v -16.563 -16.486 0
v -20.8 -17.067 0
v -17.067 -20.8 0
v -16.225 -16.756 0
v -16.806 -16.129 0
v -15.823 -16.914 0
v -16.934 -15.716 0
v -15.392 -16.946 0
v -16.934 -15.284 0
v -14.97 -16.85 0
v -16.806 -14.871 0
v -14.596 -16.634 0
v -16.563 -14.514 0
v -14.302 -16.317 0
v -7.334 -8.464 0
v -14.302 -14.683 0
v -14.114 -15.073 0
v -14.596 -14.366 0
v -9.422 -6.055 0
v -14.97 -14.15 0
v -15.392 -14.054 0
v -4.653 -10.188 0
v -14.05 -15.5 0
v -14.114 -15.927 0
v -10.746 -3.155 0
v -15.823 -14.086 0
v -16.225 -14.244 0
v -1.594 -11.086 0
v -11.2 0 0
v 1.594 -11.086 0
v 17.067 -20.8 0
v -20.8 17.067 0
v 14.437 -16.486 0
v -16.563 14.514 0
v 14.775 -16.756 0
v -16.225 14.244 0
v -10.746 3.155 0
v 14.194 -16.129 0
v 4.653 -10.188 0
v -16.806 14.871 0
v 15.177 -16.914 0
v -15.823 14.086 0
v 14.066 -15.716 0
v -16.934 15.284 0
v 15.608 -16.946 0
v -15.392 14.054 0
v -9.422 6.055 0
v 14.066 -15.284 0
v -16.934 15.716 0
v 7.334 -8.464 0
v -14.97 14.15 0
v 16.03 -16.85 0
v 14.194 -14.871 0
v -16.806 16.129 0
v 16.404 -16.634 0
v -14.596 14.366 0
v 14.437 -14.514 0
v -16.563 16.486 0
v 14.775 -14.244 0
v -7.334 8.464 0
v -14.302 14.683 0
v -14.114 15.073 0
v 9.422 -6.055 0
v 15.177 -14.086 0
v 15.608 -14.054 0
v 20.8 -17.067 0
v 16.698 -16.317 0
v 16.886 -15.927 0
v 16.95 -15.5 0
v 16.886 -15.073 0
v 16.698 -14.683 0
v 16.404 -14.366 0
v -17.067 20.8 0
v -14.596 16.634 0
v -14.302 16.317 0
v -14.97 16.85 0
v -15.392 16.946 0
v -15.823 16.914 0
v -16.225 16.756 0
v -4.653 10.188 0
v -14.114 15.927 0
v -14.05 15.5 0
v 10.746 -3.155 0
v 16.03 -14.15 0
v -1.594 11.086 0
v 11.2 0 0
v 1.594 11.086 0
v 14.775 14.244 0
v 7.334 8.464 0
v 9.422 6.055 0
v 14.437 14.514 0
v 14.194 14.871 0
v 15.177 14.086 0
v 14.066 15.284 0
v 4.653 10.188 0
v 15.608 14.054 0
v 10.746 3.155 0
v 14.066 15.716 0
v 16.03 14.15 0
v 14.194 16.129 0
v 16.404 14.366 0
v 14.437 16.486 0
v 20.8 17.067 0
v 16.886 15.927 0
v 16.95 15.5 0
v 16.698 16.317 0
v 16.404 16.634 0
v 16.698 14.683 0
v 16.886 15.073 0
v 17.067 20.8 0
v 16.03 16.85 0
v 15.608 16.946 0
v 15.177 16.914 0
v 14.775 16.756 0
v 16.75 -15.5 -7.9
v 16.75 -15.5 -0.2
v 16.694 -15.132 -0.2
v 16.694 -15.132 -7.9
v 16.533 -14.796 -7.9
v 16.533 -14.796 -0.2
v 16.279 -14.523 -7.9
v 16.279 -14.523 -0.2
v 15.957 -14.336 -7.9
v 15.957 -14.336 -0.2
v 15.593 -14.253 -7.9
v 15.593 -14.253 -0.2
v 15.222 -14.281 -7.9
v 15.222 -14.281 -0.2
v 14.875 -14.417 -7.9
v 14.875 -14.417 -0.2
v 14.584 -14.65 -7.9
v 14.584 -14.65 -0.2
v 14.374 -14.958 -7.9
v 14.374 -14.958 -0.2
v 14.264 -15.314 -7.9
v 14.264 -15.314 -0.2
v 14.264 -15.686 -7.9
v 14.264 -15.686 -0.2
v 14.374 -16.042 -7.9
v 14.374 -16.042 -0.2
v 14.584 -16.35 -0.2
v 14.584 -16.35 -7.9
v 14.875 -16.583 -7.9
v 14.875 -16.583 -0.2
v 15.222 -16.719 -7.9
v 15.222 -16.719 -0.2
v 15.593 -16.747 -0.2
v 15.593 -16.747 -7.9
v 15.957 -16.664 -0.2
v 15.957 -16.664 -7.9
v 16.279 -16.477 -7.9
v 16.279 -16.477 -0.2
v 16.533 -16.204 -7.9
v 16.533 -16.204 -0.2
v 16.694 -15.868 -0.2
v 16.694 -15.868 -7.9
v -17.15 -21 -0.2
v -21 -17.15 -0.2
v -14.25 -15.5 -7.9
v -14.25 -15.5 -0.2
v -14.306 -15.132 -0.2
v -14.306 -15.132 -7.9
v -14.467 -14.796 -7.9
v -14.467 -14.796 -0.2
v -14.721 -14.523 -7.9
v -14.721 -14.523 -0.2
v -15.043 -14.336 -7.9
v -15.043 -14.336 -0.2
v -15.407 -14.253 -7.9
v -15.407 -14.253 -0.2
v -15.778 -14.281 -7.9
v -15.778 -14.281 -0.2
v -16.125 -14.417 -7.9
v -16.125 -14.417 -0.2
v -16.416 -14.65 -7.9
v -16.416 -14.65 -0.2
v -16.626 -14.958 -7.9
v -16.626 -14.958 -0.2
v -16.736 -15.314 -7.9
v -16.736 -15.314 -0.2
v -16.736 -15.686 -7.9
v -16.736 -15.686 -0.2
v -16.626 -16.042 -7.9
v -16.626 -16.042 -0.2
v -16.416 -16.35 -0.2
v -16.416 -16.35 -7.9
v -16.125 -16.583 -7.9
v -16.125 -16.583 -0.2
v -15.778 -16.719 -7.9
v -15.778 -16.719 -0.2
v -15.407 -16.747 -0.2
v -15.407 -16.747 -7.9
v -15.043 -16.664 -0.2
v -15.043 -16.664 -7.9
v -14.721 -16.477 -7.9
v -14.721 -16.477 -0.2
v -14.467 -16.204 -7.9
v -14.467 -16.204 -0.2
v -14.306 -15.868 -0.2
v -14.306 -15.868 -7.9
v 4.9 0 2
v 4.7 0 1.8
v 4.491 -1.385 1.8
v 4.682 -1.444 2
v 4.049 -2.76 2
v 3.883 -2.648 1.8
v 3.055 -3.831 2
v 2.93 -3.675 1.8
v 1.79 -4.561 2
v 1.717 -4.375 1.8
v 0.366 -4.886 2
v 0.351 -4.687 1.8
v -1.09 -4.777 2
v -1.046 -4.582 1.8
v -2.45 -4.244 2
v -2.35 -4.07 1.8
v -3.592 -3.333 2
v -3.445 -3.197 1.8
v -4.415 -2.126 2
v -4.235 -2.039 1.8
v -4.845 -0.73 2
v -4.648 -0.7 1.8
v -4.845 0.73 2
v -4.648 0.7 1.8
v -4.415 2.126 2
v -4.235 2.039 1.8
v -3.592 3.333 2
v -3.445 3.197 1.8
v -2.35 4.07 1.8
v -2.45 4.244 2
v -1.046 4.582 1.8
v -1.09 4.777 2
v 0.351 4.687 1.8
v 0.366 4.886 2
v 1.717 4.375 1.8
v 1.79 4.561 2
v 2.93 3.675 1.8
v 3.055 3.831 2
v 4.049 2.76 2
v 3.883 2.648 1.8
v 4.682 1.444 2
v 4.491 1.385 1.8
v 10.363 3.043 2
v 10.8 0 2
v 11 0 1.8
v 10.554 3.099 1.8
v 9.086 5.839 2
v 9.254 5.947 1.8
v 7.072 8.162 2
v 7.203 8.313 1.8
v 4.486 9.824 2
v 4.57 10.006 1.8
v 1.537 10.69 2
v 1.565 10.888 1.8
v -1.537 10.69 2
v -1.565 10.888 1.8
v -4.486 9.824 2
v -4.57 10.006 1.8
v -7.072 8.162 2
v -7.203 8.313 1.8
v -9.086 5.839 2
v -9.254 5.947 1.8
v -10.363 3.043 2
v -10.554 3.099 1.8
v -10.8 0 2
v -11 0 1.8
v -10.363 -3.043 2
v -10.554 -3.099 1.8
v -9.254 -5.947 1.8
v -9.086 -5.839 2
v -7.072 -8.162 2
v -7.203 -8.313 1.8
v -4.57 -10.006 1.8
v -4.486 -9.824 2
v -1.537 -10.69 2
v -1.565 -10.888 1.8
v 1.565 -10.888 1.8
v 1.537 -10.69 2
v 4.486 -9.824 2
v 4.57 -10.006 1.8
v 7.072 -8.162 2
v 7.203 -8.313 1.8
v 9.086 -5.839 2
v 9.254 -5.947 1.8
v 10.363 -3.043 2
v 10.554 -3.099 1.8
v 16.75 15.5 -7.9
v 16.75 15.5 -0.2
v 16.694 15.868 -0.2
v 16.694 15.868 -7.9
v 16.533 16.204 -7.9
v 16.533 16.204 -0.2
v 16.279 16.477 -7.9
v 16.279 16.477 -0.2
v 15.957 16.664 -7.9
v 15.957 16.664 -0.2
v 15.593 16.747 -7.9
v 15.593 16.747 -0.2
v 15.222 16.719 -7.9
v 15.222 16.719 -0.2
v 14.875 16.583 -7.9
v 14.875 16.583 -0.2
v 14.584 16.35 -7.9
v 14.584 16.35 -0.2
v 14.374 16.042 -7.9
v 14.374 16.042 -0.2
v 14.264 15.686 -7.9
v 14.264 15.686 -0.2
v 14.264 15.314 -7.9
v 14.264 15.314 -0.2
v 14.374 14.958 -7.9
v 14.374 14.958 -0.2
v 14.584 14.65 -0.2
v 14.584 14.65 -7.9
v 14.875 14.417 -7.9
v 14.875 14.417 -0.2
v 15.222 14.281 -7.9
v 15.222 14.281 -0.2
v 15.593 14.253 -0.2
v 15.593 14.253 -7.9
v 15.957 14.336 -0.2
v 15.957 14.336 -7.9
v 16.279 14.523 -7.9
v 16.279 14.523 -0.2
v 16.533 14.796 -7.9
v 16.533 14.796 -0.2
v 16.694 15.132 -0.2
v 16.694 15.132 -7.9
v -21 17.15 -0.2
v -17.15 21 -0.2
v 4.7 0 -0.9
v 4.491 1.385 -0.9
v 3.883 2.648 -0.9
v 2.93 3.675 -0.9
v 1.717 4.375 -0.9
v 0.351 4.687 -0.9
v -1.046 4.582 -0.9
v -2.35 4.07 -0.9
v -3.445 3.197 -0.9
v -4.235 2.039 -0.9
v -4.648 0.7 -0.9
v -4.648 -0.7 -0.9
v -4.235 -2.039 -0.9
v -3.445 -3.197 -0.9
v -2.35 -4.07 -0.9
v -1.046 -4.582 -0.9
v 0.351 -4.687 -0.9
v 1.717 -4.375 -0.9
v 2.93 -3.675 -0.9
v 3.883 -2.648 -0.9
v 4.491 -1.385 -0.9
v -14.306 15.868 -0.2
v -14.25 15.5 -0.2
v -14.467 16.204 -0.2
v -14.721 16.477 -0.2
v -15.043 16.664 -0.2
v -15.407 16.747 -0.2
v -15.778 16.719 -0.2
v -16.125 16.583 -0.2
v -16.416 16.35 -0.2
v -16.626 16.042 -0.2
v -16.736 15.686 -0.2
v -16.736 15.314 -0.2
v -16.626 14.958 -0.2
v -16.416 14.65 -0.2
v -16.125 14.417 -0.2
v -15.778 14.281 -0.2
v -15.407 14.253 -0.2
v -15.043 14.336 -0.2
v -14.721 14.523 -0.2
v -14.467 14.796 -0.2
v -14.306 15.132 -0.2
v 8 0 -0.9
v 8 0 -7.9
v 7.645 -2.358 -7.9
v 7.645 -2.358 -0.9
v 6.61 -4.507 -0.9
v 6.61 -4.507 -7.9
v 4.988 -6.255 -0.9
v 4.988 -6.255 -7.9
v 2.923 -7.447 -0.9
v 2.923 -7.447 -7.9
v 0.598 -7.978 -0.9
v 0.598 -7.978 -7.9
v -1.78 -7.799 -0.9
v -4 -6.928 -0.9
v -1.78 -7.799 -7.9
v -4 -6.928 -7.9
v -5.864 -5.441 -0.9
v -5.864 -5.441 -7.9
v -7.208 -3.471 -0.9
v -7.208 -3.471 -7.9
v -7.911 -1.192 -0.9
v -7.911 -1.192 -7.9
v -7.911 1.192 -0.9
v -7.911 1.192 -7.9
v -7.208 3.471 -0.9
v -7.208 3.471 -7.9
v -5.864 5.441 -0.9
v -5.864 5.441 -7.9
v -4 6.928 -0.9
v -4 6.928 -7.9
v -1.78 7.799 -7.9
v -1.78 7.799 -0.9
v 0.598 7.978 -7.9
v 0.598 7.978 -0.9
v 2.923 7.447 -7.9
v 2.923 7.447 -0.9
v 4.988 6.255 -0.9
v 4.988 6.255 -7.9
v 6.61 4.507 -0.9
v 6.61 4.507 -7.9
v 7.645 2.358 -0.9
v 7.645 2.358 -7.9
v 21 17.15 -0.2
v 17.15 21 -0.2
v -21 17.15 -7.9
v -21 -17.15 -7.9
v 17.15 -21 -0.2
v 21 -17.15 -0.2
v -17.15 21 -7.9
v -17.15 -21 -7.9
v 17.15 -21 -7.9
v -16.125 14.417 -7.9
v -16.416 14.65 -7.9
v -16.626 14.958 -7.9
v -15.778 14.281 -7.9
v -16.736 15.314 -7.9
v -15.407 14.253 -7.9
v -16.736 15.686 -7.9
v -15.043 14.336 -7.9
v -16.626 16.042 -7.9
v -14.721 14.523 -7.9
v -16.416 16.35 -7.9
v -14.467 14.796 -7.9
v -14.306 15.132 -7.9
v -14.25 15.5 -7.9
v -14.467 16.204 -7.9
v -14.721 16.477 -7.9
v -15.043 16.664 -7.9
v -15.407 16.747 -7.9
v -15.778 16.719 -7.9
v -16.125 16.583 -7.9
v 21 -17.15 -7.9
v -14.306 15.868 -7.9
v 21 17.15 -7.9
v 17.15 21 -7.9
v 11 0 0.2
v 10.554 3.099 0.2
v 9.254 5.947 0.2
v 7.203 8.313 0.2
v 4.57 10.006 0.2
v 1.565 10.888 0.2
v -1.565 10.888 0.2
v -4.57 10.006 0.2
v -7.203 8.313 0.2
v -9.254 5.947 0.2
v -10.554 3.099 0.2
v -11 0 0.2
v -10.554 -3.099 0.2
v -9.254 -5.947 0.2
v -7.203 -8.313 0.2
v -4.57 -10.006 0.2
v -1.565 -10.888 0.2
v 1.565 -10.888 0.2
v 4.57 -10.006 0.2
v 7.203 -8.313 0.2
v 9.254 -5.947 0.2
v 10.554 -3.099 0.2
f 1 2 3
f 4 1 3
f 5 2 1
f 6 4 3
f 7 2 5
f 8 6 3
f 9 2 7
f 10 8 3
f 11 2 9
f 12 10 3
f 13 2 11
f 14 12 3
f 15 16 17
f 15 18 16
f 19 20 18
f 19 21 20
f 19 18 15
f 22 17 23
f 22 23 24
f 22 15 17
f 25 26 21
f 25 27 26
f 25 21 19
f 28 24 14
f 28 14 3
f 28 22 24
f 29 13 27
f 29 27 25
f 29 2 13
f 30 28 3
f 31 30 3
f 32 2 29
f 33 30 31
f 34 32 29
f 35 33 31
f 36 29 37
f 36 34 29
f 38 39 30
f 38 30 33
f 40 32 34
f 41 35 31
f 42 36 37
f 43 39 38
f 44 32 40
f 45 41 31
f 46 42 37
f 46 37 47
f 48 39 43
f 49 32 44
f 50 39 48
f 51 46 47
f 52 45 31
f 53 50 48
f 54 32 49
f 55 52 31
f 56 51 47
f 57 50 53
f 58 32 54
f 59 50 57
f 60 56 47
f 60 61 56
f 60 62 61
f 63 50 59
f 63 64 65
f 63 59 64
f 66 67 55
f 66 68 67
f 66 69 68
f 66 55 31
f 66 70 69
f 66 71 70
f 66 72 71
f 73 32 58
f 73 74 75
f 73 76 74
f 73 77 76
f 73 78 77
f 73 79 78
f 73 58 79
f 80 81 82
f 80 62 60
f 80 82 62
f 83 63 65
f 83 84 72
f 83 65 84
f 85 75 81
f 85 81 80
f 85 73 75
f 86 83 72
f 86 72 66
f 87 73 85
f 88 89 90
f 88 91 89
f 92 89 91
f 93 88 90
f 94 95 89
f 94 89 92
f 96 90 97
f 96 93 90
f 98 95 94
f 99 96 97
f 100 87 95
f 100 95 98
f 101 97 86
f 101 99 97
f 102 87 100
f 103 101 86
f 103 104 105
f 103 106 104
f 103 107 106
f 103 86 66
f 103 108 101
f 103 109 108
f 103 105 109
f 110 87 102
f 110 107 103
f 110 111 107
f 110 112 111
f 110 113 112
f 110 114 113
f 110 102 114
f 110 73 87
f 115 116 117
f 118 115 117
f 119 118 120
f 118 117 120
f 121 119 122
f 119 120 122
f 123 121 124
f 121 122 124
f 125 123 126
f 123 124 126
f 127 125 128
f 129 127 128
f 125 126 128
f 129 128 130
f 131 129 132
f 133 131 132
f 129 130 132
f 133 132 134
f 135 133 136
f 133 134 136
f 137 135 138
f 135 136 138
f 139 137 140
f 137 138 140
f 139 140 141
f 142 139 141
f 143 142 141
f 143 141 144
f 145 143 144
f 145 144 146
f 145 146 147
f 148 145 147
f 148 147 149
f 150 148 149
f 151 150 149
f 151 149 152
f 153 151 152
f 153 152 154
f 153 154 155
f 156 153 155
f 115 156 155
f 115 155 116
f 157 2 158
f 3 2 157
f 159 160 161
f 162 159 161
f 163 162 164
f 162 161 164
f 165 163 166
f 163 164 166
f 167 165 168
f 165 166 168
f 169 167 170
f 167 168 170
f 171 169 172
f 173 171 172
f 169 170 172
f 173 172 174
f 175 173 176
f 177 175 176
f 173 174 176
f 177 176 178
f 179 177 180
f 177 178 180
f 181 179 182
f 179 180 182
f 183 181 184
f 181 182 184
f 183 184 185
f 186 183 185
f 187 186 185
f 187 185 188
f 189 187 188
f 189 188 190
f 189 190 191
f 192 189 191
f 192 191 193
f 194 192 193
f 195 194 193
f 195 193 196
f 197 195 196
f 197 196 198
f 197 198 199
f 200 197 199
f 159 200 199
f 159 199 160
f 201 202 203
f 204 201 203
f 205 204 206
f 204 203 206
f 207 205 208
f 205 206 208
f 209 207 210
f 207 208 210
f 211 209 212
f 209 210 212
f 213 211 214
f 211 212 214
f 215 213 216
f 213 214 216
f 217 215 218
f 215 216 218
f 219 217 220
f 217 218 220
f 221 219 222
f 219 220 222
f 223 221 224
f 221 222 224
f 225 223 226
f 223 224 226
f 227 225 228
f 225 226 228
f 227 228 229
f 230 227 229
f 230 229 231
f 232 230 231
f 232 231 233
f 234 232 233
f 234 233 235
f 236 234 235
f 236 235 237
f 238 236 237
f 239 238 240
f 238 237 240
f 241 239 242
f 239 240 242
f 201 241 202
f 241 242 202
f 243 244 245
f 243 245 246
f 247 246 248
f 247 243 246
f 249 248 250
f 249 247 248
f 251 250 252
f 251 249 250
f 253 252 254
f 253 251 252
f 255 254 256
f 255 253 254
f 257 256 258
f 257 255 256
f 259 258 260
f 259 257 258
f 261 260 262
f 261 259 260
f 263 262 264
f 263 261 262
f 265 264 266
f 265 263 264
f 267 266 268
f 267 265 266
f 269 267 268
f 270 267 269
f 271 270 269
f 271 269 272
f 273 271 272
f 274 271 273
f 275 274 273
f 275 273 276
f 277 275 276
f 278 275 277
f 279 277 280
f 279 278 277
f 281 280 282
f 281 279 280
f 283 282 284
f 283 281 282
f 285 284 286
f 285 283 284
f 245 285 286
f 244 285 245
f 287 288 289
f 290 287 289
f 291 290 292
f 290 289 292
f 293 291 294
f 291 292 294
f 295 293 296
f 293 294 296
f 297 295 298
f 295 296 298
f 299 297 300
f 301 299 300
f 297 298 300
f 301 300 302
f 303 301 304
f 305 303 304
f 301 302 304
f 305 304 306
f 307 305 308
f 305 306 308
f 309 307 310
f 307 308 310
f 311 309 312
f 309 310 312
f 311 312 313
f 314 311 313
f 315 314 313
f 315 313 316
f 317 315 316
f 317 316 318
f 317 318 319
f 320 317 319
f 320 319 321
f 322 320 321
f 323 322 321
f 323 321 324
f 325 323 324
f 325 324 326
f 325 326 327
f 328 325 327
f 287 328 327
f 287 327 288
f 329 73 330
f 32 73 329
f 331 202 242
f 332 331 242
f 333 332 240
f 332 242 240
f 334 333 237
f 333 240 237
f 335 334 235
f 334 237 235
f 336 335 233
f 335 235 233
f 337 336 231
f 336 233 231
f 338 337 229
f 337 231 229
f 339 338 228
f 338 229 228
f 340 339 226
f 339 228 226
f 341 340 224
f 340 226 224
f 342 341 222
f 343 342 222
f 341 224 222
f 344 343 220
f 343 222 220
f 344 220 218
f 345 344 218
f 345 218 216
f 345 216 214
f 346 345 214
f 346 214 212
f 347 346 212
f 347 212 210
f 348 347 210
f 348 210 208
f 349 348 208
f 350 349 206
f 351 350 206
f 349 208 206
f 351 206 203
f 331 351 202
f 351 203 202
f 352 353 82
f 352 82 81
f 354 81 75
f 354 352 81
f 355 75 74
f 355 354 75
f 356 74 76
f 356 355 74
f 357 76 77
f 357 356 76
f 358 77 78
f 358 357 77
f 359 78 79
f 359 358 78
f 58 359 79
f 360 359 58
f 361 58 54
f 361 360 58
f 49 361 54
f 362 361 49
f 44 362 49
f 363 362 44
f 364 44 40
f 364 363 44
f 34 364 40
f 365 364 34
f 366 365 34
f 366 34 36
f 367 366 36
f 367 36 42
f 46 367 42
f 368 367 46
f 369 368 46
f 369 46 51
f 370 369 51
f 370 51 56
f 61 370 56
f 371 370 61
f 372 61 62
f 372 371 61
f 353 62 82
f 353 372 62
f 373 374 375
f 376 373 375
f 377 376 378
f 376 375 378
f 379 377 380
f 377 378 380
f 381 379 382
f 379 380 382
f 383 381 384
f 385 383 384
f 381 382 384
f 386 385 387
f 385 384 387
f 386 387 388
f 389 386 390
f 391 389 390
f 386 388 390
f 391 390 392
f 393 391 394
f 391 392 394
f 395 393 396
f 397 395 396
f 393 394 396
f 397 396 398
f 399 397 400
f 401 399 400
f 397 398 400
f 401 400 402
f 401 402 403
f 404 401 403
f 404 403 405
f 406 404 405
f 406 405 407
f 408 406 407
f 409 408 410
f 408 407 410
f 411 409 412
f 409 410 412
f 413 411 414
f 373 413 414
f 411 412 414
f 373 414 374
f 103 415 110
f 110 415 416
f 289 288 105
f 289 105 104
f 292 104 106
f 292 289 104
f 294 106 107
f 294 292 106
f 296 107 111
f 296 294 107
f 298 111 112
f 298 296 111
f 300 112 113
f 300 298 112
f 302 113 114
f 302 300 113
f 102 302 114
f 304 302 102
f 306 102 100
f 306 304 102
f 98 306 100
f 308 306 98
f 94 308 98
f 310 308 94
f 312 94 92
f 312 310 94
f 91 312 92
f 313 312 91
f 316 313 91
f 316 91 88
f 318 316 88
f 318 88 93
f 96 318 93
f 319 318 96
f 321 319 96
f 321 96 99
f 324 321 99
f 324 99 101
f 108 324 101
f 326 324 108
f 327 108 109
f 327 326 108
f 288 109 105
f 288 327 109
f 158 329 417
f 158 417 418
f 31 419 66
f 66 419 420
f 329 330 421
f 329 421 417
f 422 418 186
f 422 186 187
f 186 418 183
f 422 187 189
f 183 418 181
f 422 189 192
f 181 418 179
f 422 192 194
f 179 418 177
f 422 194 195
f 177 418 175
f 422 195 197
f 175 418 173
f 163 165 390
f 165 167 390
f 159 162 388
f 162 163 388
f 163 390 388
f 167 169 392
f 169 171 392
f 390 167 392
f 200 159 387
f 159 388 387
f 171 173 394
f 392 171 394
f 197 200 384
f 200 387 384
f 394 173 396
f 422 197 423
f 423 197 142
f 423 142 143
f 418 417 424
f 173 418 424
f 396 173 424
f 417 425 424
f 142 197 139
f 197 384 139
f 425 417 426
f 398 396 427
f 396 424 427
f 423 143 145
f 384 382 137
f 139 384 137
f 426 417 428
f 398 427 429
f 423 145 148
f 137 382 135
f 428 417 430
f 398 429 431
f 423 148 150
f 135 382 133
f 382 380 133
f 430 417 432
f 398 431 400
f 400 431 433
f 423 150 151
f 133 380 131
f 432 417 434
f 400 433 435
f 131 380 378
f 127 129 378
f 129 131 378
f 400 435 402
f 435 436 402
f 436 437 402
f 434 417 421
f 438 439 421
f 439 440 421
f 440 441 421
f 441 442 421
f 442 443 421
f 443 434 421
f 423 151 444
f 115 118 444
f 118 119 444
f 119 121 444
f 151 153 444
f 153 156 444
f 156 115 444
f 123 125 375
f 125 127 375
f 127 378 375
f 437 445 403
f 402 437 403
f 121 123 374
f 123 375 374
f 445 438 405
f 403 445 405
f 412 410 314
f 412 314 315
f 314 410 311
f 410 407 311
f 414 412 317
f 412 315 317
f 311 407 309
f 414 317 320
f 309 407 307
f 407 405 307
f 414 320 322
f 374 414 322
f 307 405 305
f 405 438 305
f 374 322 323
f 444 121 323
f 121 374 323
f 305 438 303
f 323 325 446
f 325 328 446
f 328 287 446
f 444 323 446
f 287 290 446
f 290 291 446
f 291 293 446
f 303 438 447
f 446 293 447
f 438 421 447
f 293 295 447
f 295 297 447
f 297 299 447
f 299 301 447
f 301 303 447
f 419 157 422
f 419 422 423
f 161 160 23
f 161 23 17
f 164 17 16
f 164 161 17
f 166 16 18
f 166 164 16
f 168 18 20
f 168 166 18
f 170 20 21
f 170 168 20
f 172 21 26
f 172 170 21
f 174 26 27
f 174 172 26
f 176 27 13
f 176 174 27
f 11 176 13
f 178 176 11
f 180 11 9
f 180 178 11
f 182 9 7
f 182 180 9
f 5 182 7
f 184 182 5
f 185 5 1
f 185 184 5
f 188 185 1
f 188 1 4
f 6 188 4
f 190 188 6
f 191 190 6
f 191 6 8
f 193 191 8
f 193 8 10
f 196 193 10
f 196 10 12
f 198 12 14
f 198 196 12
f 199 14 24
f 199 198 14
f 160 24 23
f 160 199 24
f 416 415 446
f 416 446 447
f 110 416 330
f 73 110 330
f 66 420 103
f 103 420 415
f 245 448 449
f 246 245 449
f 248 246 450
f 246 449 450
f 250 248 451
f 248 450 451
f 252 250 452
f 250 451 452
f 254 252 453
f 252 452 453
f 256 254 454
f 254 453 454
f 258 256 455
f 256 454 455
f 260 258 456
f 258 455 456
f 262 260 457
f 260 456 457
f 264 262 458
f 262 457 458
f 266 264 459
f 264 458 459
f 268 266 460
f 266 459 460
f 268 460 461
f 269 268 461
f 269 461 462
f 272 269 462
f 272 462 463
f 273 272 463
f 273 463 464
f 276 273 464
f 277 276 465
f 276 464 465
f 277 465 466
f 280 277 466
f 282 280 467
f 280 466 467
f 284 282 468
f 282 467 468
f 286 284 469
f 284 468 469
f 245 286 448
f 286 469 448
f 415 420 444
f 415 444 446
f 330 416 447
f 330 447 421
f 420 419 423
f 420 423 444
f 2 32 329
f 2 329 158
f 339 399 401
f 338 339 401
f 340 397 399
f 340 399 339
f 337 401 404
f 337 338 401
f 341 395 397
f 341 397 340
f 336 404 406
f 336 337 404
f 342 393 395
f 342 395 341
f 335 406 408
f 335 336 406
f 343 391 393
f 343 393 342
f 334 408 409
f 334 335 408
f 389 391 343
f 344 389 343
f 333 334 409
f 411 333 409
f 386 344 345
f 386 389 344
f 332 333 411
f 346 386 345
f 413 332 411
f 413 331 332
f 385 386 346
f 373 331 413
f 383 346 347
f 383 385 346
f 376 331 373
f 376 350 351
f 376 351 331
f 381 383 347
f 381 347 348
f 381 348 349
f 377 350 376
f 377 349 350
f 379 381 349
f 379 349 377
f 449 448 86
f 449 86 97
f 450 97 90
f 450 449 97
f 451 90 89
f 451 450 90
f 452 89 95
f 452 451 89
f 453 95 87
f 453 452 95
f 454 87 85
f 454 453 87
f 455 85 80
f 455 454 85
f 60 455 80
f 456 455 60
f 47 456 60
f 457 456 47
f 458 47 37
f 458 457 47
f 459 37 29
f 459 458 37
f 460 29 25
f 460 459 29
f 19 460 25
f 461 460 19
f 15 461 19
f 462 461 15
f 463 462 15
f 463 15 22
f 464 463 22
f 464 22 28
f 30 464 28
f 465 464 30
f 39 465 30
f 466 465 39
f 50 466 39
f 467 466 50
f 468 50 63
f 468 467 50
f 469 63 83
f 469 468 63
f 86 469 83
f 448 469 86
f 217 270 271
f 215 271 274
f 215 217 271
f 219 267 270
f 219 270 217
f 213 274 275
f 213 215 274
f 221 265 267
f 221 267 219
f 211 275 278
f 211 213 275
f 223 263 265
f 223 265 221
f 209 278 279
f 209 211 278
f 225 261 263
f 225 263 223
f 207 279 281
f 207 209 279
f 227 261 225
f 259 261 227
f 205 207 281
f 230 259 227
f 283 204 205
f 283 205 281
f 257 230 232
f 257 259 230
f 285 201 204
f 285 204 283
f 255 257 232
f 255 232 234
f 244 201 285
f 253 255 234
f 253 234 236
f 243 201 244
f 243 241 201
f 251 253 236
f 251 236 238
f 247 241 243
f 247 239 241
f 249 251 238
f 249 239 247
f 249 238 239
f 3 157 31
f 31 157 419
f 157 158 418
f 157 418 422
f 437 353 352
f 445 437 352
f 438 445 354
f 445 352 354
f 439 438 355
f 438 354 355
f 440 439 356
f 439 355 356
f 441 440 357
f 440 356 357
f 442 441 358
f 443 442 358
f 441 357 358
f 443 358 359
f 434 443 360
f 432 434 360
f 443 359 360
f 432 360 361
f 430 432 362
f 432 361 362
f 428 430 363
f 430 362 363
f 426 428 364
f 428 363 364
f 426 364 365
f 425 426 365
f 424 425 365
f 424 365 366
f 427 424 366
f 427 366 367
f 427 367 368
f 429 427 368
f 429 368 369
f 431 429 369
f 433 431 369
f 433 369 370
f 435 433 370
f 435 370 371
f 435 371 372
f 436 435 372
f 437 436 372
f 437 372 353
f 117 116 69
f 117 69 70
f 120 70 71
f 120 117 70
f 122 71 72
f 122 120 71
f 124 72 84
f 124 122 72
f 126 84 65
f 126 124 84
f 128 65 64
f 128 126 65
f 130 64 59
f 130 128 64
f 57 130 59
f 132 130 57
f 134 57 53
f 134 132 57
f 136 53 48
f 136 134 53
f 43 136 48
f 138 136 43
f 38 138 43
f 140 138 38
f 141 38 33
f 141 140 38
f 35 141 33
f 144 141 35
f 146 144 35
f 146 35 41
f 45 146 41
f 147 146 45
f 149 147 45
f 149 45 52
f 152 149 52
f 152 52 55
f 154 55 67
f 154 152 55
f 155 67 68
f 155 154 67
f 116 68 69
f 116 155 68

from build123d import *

# Parameters (mm, degrees)
SKETCH_R          = 11
PAD_DEPTH         = 2
PAD001_DEPTH      = 7.9
SKETCH002_R       = 4.7
POCKET_DEPTH      = 7.901
POCKET_DEPTH_BACK = 2.001
SKETCH003_R       = 1.25
HOLE_DEPTH        = 7.901
SKETCH004_R       = 8
POCKET001_DEPTH   = 7
CHAMFER_SIZE      = 0.2


with BuildPart() as part:
    # Sketch → Pad (new body)
    with BuildSketch(Plane.XY):
        Circle(SKETCH_R)
    extrude(amount=PAD_DEPTH)

    # Sketch001 → Pad001 (join)
    with BuildSketch(Plane.XY):
        Polygon((-21, 17.15), (-21, -17.15), (-17.15, -21), (17.15, -21), (21, -17.15), (21, 17.15), (17.15, 21), (-17.15, 21), align=None)
    extrude(amount=-PAD001_DEPTH)

    # Sketch002 → Pocket (cut, two sides)
    with BuildSketch(Plane.XY) as pocket_sk:
        Circle(SKETCH002_R)
    extrude(amount=-POCKET_DEPTH, mode=Mode.SUBTRACT)
    extrude(pocket_sk.sketch, amount=POCKET_DEPTH_BACK, mode=Mode.SUBTRACT)

    # Sketch003 → Hole (cut, through all)
    with BuildSketch(Plane.XY):
        with Locations((-15.5, 15.5)):
            Circle(SKETCH003_R)
        with Locations((15.5, 15.5)):
            Circle(SKETCH003_R)
        with Locations((15.5, -15.5)):
            Circle(SKETCH003_R)
        with Locations((-15.5, -15.5)):
            Circle(SKETCH003_R)
    extrude(amount=-HOLE_DEPTH, mode=Mode.SUBTRACT)

    # Sketch004 → Pocket001 (cut)
    with BuildSketch(Plane(origin=(0, 0, -7.9), x_dir=(1, 0, 0), z_dir=(0, 0, -1))):
        Circle(SKETCH004_R)
    extrude(amount=-POCKET001_DEPTH, mode=Mode.SUBTRACT)

    # Chamfer
    chamfer_edges = [part.edges().sort_by_distance(p)[0] for p in [
        (-21, 0, 0),
        (-19.075, 19.075, 0),
        (-19.075, -19.075, 0),
        (0, 21, 0),
        (0, -21, 0),
        (19.075, 19.075, 0),
        (19.075, -19.075, 0),
        (21, 0, 0),
        (-16.75, -15.5, 0),
        (-16.75, 15.5, 0),
        (-11, 0, 0),
        (14.25, 15.5, 0),
        (14.25, -15.5, 0),
        (-11, 0, 2),
        (-4.7, 0, 2),
    ]]
    chamfer(chamfer_edges, length=CHAMFER_SIZE)


solid = part.part
